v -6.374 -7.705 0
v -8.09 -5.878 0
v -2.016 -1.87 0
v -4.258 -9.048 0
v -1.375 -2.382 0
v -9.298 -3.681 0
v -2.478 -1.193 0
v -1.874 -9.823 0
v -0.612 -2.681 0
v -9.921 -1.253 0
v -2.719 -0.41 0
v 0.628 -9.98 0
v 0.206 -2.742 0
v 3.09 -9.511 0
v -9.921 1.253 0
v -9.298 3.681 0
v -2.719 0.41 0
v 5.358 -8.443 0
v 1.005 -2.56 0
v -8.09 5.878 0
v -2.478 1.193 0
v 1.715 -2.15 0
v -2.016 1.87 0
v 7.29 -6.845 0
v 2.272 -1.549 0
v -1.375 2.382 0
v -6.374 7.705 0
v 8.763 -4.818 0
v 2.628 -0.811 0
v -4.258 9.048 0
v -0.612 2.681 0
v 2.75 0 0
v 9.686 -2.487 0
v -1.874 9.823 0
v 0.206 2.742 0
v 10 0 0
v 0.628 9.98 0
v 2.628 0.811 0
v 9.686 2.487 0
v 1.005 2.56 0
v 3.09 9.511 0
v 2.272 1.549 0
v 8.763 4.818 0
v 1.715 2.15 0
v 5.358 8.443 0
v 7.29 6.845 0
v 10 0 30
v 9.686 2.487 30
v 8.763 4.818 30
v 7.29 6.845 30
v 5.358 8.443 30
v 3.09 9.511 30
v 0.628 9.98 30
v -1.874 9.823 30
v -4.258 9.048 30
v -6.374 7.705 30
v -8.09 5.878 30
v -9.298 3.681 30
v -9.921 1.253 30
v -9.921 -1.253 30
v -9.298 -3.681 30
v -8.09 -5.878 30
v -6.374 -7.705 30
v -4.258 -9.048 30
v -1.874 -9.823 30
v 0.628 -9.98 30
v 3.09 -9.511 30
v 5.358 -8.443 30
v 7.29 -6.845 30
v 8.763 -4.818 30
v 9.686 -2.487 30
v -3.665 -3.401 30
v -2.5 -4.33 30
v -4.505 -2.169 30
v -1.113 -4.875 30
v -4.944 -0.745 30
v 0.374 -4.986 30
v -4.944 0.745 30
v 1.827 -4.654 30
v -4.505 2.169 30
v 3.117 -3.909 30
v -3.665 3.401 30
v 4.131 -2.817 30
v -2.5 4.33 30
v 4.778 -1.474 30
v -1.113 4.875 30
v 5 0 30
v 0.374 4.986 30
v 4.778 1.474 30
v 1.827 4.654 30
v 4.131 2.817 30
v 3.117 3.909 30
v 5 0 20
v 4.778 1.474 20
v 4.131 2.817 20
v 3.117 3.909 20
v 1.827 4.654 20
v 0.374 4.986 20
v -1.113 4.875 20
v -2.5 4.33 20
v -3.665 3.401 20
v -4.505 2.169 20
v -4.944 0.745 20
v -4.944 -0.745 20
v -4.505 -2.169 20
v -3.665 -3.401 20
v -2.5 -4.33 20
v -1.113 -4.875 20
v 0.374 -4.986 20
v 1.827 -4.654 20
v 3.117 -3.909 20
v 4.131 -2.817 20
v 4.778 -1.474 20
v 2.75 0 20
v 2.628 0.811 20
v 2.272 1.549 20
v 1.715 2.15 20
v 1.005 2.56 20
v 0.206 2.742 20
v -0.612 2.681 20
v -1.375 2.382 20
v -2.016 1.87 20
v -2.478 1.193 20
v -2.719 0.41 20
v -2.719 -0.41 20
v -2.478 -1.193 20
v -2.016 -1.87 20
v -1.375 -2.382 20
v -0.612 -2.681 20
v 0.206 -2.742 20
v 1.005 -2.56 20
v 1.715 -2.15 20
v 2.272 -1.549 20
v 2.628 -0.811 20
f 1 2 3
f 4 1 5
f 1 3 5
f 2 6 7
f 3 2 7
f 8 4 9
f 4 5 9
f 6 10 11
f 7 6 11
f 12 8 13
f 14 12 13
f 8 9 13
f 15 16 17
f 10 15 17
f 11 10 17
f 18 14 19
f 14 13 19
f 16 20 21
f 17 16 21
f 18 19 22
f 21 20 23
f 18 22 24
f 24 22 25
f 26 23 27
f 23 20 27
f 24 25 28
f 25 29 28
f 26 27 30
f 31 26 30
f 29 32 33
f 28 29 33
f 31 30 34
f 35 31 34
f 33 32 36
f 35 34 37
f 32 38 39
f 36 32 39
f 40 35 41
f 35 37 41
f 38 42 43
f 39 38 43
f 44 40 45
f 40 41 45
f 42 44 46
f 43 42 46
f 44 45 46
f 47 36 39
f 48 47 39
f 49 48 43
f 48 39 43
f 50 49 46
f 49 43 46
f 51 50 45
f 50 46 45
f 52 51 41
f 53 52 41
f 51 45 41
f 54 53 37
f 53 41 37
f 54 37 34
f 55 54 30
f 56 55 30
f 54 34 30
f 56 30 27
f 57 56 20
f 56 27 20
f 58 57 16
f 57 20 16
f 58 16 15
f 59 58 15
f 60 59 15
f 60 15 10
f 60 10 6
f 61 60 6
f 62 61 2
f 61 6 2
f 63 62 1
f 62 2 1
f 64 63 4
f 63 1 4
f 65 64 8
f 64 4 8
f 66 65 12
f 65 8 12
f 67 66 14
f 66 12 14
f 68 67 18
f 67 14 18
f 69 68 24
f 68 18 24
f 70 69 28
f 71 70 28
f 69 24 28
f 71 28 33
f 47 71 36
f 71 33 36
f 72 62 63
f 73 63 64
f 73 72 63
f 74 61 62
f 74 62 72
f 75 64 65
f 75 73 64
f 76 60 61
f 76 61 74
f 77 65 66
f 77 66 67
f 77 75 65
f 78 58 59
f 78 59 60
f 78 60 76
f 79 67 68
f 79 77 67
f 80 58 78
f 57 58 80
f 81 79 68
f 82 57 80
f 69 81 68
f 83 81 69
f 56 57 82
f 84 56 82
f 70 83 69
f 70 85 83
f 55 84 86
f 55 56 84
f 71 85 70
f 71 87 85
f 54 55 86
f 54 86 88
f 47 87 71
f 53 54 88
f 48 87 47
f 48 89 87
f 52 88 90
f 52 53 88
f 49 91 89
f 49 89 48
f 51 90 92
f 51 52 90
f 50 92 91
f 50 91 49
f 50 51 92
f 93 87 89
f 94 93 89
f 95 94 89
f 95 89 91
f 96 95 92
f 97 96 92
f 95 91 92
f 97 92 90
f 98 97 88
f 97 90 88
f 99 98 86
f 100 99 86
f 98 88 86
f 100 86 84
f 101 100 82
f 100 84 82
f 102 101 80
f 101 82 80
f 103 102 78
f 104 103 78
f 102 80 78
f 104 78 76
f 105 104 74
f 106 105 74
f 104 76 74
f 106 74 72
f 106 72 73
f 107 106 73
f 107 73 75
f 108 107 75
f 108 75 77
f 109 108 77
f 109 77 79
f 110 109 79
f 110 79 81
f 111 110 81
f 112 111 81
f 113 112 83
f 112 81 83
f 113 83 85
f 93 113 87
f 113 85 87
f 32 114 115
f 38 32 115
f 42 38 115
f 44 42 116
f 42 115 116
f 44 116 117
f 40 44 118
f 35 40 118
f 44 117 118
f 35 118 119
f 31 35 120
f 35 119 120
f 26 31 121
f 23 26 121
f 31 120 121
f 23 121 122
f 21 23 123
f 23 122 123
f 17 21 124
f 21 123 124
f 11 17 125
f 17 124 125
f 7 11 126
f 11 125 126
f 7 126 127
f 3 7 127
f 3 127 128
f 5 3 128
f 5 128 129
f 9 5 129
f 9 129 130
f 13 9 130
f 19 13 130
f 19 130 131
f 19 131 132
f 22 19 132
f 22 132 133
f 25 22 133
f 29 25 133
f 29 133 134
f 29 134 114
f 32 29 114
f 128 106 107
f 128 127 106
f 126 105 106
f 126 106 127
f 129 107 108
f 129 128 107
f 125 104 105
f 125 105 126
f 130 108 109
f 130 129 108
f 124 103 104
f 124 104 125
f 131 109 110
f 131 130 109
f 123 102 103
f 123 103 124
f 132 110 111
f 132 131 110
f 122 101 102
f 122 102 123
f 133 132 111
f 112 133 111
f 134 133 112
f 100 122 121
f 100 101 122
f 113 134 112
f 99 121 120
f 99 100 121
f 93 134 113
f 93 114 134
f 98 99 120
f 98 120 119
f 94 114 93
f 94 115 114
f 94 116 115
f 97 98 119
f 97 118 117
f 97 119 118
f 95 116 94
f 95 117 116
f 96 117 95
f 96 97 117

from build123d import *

# Parameters (mm, degrees)
SKETCH_R        = 10
PAD_DEPTH       = 30
SKETCH001_R     = 2.75
POCKET_DEPTH    = 30.001
SKETCH002_R     = 5
POCKET001_DEPTH = 10


with BuildPart() as part:
    # Sketch → Pad (new body)
    with BuildSketch(Plane.XY):
        Circle(SKETCH_R)
    extrude(amount=PAD_DEPTH)

    # Sketch001 (on Face3 of Pad) → Pocket (cut, through all)
    with BuildSketch(Plane.XY.offset(30)):
        Circle(SKETCH001_R)
    extrude(amount=-POCKET_DEPTH, mode=Mode.SUBTRACT)

    # Sketch002 (on Face3 of Pocket) → Pocket001 (cut)
    with BuildSketch(Plane.XY.offset(30)):
        Circle(SKETCH002_R)
    extrude(amount=-POCKET001_DEPTH, mode=Mode.SUBTRACT)


solid = part.part
